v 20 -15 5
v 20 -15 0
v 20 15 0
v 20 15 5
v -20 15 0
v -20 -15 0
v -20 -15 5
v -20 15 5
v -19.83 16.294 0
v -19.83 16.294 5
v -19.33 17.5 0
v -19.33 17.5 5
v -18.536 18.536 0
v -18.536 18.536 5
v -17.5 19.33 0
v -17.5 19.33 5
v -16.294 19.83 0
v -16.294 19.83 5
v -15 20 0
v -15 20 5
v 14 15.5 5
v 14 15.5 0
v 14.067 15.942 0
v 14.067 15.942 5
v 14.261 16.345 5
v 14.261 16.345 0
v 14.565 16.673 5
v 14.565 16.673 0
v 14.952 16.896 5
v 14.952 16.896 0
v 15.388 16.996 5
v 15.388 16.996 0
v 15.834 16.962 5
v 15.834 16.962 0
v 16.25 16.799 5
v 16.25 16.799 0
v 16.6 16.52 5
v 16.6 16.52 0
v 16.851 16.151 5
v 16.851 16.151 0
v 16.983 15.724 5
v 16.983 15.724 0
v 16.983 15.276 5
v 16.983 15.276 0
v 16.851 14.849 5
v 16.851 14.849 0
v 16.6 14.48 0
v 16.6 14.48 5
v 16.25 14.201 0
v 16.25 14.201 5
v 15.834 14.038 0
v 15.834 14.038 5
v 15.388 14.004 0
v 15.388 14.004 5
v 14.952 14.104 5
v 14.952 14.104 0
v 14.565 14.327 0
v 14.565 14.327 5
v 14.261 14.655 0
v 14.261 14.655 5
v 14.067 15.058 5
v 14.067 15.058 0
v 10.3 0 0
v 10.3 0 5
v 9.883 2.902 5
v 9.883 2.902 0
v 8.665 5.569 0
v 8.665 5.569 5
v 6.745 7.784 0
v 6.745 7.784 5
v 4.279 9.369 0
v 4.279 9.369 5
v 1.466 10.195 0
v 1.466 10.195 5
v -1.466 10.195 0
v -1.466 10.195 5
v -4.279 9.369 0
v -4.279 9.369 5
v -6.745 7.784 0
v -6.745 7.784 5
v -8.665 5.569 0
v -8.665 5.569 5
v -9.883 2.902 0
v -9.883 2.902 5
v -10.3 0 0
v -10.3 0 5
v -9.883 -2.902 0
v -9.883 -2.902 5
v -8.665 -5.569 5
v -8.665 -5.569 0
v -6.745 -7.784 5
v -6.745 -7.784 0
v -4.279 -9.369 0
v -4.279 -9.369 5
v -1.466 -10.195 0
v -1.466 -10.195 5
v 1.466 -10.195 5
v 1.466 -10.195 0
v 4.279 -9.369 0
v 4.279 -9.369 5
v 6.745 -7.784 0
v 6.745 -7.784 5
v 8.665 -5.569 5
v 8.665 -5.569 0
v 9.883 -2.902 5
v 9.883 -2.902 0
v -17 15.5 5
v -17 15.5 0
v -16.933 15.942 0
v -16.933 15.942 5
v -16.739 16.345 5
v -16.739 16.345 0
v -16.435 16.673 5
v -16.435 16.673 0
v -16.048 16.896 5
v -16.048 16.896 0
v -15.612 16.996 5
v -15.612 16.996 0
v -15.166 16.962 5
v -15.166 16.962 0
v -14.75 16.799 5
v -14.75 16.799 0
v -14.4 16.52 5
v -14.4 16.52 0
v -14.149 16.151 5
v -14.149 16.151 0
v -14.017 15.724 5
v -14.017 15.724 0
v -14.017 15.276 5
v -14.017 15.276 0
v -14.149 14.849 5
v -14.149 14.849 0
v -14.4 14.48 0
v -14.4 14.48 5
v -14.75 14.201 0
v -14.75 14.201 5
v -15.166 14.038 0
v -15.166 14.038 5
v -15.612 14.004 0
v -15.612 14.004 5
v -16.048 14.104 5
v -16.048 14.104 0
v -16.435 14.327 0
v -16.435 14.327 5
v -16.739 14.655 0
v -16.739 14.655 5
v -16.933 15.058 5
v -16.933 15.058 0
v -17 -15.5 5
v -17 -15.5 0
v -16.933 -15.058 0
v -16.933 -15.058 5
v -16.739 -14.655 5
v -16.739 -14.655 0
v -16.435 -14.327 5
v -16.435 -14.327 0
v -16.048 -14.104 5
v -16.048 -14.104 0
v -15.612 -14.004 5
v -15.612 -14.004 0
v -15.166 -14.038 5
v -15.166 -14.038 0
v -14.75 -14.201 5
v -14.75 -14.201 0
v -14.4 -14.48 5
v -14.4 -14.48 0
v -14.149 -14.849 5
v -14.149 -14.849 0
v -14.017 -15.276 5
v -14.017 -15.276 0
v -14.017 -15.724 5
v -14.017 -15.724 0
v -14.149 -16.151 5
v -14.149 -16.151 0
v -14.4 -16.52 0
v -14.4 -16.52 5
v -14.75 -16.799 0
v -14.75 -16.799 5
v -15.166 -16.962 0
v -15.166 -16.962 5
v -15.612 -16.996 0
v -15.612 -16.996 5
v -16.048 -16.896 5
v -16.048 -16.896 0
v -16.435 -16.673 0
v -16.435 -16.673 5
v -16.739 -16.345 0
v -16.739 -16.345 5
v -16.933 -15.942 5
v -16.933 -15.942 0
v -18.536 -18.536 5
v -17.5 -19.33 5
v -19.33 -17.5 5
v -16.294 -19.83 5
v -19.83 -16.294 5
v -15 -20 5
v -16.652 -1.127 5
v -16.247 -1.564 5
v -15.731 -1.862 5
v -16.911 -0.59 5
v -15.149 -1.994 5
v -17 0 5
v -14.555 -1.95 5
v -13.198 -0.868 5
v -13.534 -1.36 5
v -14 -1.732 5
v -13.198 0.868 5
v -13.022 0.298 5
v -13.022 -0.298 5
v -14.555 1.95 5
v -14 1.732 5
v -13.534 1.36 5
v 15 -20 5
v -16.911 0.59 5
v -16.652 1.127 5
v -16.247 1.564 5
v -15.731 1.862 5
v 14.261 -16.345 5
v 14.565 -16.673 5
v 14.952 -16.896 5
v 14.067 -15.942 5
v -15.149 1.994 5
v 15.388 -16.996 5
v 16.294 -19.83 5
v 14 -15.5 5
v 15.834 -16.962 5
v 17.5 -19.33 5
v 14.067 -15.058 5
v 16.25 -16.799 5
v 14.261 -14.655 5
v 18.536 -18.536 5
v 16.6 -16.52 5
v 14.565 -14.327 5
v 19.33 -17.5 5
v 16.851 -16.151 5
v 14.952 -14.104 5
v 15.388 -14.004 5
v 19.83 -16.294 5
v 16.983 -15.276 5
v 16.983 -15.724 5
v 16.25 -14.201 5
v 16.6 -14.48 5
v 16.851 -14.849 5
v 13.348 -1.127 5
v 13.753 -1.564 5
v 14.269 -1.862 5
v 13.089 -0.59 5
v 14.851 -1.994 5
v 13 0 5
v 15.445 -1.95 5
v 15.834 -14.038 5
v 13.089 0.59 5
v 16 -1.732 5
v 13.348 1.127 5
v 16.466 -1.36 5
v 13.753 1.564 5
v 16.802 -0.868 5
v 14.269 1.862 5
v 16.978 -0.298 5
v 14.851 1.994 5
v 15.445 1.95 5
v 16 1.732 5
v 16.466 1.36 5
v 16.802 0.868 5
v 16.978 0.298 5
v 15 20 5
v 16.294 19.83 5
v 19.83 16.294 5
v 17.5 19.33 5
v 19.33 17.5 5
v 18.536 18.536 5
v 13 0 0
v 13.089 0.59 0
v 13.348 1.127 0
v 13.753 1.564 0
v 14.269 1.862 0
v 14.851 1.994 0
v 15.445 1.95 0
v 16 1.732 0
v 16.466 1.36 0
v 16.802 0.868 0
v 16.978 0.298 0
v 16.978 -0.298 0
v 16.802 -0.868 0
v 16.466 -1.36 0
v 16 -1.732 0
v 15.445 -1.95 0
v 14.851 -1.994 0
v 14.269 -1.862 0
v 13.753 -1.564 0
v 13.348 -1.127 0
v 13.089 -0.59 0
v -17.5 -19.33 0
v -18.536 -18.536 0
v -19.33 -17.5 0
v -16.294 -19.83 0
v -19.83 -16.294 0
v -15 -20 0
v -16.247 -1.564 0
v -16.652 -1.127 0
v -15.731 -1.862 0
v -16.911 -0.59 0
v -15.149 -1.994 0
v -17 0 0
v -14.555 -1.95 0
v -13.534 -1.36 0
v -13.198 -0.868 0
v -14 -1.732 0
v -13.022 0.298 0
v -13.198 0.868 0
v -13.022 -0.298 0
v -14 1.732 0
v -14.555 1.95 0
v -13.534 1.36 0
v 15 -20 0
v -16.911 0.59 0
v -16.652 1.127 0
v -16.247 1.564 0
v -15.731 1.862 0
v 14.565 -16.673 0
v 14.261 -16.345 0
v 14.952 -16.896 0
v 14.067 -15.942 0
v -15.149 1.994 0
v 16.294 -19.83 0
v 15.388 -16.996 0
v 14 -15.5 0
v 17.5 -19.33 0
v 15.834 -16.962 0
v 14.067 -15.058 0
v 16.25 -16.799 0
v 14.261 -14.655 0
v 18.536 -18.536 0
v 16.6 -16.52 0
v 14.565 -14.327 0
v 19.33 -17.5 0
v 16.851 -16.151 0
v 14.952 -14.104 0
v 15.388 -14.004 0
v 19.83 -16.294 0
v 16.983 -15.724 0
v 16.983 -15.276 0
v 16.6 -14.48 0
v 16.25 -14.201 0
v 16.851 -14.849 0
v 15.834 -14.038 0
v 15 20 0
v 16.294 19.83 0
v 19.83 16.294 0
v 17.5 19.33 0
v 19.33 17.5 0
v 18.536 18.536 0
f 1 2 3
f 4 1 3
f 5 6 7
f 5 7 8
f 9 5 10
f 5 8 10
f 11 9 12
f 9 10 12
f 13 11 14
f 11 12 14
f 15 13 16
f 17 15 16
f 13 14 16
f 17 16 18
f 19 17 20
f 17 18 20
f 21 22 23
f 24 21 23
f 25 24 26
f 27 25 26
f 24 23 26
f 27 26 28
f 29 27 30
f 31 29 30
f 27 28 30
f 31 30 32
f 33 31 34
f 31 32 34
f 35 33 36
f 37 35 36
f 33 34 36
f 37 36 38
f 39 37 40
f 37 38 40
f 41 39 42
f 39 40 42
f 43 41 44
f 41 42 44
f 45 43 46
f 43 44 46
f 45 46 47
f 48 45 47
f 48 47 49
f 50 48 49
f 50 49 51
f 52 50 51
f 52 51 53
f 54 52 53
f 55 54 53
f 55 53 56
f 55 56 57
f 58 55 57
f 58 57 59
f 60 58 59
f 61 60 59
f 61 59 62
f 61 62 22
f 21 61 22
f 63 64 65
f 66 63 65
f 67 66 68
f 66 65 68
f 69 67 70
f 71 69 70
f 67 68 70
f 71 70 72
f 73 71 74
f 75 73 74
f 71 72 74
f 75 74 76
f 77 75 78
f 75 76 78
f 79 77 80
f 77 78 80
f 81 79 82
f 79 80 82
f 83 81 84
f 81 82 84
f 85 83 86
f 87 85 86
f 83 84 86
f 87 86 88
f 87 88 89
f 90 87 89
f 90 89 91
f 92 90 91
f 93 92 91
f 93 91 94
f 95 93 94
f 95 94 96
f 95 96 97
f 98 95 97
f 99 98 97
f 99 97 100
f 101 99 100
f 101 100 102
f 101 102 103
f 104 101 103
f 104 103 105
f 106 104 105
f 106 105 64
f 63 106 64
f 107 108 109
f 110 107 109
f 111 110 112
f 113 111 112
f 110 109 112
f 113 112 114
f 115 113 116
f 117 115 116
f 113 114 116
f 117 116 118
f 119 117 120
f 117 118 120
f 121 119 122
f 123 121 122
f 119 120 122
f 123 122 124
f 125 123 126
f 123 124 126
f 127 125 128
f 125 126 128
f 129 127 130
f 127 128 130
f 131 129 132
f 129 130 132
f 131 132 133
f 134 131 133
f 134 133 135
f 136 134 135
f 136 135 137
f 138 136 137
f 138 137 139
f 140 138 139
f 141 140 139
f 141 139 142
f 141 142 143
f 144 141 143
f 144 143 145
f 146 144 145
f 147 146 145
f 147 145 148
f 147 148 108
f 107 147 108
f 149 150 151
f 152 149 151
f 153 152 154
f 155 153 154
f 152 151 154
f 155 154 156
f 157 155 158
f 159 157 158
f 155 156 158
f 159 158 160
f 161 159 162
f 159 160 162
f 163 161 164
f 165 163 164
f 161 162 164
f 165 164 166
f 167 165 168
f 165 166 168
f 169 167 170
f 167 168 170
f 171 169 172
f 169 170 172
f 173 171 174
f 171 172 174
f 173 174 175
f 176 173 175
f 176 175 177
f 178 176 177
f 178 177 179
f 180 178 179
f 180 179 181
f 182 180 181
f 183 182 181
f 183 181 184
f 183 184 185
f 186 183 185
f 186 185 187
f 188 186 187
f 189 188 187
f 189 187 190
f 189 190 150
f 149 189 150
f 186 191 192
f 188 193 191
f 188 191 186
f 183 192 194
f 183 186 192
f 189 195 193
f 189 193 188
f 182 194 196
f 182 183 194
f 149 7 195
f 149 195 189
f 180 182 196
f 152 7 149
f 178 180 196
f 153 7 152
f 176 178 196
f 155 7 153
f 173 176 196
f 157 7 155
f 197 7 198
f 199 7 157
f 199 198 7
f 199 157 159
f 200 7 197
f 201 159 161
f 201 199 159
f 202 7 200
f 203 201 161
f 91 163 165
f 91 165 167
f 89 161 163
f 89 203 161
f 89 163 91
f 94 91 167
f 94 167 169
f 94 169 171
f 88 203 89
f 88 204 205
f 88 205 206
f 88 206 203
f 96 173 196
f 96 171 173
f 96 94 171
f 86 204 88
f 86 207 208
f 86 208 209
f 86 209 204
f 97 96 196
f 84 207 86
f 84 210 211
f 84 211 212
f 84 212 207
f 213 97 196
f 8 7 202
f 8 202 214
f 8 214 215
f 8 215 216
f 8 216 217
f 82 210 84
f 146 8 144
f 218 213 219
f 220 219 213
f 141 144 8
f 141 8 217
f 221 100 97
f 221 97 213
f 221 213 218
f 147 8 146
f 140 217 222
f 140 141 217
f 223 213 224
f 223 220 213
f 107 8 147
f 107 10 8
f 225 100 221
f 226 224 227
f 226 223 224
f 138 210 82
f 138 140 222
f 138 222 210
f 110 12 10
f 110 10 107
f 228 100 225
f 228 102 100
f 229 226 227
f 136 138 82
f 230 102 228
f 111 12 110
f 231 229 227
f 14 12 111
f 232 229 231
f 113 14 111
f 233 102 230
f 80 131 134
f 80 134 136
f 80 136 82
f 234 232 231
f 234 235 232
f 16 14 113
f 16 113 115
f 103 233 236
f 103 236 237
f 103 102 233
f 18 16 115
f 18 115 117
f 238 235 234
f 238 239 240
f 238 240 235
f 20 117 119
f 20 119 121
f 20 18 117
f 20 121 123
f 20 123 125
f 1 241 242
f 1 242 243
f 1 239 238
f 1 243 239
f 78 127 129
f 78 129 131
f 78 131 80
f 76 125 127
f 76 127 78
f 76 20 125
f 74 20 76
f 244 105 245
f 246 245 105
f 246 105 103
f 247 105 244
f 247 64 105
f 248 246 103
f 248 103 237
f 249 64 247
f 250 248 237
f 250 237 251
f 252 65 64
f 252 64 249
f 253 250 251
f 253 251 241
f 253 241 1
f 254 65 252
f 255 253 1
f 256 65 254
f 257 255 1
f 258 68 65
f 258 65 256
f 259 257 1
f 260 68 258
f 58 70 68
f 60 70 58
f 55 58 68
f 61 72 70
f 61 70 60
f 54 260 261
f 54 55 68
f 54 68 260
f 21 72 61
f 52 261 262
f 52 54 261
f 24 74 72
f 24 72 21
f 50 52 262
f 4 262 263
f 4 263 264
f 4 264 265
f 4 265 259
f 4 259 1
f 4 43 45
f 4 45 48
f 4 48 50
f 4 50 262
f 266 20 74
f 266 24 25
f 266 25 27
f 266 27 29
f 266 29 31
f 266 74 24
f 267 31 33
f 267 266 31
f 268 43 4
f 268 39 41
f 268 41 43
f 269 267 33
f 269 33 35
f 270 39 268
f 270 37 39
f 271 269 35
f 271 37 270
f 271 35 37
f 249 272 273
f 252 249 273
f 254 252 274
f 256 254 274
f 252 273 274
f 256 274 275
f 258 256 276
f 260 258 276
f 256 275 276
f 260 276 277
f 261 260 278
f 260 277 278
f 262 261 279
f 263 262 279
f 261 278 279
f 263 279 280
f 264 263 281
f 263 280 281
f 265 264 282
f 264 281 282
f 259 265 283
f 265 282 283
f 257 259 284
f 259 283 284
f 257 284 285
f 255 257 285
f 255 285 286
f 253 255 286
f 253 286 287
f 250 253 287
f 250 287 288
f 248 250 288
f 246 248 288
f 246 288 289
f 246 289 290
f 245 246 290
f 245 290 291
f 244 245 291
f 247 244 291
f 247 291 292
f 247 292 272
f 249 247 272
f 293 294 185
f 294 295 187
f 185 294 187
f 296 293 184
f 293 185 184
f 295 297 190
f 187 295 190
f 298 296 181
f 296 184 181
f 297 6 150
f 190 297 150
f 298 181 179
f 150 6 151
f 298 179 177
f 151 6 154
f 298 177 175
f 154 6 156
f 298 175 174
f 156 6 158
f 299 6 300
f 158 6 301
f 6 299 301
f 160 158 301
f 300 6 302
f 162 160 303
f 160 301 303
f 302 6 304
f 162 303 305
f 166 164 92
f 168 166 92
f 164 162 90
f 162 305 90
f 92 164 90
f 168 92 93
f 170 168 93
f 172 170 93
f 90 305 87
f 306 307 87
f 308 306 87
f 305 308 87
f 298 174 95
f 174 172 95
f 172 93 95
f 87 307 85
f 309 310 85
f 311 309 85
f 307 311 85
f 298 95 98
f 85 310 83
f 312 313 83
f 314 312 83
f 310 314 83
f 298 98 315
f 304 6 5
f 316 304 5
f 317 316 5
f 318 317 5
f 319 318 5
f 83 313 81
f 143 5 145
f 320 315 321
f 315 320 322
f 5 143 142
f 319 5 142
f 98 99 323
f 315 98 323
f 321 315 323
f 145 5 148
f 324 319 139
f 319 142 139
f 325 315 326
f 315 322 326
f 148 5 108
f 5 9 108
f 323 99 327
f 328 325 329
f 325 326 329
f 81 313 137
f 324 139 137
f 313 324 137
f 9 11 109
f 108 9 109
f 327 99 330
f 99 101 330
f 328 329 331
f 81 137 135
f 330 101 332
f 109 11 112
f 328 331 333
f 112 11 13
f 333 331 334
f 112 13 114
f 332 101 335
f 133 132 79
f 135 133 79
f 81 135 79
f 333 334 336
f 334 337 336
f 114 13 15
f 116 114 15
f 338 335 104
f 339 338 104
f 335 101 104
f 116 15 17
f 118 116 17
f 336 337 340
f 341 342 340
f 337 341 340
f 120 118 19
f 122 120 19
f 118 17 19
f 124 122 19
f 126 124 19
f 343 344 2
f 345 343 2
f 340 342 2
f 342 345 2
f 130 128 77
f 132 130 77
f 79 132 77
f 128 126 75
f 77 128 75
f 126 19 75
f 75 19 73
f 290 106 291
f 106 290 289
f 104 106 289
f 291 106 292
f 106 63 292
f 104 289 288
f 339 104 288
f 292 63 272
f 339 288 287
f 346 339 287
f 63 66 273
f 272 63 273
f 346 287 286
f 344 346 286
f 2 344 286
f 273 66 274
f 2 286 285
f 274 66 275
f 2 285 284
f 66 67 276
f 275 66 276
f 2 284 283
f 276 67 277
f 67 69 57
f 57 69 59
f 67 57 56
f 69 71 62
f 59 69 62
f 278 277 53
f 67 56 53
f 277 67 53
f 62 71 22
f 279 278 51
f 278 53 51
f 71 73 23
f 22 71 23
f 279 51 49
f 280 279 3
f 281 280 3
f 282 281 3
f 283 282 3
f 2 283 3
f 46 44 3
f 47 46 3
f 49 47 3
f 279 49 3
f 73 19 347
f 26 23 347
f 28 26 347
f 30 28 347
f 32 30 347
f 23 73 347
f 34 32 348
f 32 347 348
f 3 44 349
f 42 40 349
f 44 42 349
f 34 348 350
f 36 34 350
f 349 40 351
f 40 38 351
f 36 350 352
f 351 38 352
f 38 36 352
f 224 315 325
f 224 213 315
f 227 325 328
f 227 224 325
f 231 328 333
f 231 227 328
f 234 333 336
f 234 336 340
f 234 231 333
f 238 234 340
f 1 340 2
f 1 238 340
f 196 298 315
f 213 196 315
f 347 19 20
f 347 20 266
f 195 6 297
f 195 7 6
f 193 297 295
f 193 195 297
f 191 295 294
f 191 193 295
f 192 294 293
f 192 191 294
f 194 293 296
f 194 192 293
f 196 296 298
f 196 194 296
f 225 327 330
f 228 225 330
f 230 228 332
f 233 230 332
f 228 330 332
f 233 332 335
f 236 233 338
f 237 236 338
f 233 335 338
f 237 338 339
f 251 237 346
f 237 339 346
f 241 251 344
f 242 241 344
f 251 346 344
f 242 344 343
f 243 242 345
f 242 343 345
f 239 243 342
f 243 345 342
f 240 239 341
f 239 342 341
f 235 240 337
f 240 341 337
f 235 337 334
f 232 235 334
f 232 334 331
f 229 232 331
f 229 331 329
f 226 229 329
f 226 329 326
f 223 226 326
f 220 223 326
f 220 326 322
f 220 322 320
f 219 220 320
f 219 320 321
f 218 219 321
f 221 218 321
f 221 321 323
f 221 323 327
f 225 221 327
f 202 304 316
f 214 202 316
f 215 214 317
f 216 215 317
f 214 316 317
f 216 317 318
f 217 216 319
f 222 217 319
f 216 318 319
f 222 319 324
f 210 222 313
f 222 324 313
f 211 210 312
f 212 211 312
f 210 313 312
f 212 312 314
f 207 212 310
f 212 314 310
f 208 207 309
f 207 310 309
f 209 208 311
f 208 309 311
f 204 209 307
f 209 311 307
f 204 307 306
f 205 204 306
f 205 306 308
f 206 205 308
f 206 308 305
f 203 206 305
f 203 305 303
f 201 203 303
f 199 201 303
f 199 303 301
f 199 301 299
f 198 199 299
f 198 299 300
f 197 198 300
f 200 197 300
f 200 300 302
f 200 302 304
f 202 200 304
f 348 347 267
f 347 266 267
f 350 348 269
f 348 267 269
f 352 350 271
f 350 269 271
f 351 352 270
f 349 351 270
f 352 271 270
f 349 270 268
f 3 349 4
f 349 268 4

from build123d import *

# Parameters (mm, degrees)
F0_W     = 40
F0_H     = 40
F1_DEPTH = 5
F2_R     = 10.3
F3_DEPTH = 5.001
F6_D     = 3
F7_D     = 4
F8_R     = 5


with BuildPart() as f1:
    # F0 (on Top) → F1 (new body)
    with BuildSketch(Plane.XY):
        Rectangle(F0_W, F0_H)
    extrude(amount=F1_DEPTH)

    # F2 (on face) → F3 (cut, through all)
    with BuildSketch(Plane.XY.offset(5)):
        Circle(F2_R)
    extrude(amount=-F3_DEPTH, mode=Mode.SUBTRACT)

    # F6 (through all)
    with Locations(Plane.XY.offset(5)):
        with Locations((-15.5, 15.5), (15.5, 15.5), (15.5, -15.5), (-15.5, -15.5)):
            Hole(F6_D / 2)

    # F7 (through all)
    with Locations(Plane.XY.offset(5)):
        with Locations((-15, 0), (15, 0)):
            Hole(F7_D / 2)

    # F8
    f8_edges = [f1.edges().sort_by_distance(p)[0] for p in [
        (-20, 20, 2.5),
        (20, 20, 2.5),
        (-20, -20, 2.5),
        (20, -20, 2.5),
    ]]
    fillet(f8_edges, radius=F8_R)


solid = f1.part
